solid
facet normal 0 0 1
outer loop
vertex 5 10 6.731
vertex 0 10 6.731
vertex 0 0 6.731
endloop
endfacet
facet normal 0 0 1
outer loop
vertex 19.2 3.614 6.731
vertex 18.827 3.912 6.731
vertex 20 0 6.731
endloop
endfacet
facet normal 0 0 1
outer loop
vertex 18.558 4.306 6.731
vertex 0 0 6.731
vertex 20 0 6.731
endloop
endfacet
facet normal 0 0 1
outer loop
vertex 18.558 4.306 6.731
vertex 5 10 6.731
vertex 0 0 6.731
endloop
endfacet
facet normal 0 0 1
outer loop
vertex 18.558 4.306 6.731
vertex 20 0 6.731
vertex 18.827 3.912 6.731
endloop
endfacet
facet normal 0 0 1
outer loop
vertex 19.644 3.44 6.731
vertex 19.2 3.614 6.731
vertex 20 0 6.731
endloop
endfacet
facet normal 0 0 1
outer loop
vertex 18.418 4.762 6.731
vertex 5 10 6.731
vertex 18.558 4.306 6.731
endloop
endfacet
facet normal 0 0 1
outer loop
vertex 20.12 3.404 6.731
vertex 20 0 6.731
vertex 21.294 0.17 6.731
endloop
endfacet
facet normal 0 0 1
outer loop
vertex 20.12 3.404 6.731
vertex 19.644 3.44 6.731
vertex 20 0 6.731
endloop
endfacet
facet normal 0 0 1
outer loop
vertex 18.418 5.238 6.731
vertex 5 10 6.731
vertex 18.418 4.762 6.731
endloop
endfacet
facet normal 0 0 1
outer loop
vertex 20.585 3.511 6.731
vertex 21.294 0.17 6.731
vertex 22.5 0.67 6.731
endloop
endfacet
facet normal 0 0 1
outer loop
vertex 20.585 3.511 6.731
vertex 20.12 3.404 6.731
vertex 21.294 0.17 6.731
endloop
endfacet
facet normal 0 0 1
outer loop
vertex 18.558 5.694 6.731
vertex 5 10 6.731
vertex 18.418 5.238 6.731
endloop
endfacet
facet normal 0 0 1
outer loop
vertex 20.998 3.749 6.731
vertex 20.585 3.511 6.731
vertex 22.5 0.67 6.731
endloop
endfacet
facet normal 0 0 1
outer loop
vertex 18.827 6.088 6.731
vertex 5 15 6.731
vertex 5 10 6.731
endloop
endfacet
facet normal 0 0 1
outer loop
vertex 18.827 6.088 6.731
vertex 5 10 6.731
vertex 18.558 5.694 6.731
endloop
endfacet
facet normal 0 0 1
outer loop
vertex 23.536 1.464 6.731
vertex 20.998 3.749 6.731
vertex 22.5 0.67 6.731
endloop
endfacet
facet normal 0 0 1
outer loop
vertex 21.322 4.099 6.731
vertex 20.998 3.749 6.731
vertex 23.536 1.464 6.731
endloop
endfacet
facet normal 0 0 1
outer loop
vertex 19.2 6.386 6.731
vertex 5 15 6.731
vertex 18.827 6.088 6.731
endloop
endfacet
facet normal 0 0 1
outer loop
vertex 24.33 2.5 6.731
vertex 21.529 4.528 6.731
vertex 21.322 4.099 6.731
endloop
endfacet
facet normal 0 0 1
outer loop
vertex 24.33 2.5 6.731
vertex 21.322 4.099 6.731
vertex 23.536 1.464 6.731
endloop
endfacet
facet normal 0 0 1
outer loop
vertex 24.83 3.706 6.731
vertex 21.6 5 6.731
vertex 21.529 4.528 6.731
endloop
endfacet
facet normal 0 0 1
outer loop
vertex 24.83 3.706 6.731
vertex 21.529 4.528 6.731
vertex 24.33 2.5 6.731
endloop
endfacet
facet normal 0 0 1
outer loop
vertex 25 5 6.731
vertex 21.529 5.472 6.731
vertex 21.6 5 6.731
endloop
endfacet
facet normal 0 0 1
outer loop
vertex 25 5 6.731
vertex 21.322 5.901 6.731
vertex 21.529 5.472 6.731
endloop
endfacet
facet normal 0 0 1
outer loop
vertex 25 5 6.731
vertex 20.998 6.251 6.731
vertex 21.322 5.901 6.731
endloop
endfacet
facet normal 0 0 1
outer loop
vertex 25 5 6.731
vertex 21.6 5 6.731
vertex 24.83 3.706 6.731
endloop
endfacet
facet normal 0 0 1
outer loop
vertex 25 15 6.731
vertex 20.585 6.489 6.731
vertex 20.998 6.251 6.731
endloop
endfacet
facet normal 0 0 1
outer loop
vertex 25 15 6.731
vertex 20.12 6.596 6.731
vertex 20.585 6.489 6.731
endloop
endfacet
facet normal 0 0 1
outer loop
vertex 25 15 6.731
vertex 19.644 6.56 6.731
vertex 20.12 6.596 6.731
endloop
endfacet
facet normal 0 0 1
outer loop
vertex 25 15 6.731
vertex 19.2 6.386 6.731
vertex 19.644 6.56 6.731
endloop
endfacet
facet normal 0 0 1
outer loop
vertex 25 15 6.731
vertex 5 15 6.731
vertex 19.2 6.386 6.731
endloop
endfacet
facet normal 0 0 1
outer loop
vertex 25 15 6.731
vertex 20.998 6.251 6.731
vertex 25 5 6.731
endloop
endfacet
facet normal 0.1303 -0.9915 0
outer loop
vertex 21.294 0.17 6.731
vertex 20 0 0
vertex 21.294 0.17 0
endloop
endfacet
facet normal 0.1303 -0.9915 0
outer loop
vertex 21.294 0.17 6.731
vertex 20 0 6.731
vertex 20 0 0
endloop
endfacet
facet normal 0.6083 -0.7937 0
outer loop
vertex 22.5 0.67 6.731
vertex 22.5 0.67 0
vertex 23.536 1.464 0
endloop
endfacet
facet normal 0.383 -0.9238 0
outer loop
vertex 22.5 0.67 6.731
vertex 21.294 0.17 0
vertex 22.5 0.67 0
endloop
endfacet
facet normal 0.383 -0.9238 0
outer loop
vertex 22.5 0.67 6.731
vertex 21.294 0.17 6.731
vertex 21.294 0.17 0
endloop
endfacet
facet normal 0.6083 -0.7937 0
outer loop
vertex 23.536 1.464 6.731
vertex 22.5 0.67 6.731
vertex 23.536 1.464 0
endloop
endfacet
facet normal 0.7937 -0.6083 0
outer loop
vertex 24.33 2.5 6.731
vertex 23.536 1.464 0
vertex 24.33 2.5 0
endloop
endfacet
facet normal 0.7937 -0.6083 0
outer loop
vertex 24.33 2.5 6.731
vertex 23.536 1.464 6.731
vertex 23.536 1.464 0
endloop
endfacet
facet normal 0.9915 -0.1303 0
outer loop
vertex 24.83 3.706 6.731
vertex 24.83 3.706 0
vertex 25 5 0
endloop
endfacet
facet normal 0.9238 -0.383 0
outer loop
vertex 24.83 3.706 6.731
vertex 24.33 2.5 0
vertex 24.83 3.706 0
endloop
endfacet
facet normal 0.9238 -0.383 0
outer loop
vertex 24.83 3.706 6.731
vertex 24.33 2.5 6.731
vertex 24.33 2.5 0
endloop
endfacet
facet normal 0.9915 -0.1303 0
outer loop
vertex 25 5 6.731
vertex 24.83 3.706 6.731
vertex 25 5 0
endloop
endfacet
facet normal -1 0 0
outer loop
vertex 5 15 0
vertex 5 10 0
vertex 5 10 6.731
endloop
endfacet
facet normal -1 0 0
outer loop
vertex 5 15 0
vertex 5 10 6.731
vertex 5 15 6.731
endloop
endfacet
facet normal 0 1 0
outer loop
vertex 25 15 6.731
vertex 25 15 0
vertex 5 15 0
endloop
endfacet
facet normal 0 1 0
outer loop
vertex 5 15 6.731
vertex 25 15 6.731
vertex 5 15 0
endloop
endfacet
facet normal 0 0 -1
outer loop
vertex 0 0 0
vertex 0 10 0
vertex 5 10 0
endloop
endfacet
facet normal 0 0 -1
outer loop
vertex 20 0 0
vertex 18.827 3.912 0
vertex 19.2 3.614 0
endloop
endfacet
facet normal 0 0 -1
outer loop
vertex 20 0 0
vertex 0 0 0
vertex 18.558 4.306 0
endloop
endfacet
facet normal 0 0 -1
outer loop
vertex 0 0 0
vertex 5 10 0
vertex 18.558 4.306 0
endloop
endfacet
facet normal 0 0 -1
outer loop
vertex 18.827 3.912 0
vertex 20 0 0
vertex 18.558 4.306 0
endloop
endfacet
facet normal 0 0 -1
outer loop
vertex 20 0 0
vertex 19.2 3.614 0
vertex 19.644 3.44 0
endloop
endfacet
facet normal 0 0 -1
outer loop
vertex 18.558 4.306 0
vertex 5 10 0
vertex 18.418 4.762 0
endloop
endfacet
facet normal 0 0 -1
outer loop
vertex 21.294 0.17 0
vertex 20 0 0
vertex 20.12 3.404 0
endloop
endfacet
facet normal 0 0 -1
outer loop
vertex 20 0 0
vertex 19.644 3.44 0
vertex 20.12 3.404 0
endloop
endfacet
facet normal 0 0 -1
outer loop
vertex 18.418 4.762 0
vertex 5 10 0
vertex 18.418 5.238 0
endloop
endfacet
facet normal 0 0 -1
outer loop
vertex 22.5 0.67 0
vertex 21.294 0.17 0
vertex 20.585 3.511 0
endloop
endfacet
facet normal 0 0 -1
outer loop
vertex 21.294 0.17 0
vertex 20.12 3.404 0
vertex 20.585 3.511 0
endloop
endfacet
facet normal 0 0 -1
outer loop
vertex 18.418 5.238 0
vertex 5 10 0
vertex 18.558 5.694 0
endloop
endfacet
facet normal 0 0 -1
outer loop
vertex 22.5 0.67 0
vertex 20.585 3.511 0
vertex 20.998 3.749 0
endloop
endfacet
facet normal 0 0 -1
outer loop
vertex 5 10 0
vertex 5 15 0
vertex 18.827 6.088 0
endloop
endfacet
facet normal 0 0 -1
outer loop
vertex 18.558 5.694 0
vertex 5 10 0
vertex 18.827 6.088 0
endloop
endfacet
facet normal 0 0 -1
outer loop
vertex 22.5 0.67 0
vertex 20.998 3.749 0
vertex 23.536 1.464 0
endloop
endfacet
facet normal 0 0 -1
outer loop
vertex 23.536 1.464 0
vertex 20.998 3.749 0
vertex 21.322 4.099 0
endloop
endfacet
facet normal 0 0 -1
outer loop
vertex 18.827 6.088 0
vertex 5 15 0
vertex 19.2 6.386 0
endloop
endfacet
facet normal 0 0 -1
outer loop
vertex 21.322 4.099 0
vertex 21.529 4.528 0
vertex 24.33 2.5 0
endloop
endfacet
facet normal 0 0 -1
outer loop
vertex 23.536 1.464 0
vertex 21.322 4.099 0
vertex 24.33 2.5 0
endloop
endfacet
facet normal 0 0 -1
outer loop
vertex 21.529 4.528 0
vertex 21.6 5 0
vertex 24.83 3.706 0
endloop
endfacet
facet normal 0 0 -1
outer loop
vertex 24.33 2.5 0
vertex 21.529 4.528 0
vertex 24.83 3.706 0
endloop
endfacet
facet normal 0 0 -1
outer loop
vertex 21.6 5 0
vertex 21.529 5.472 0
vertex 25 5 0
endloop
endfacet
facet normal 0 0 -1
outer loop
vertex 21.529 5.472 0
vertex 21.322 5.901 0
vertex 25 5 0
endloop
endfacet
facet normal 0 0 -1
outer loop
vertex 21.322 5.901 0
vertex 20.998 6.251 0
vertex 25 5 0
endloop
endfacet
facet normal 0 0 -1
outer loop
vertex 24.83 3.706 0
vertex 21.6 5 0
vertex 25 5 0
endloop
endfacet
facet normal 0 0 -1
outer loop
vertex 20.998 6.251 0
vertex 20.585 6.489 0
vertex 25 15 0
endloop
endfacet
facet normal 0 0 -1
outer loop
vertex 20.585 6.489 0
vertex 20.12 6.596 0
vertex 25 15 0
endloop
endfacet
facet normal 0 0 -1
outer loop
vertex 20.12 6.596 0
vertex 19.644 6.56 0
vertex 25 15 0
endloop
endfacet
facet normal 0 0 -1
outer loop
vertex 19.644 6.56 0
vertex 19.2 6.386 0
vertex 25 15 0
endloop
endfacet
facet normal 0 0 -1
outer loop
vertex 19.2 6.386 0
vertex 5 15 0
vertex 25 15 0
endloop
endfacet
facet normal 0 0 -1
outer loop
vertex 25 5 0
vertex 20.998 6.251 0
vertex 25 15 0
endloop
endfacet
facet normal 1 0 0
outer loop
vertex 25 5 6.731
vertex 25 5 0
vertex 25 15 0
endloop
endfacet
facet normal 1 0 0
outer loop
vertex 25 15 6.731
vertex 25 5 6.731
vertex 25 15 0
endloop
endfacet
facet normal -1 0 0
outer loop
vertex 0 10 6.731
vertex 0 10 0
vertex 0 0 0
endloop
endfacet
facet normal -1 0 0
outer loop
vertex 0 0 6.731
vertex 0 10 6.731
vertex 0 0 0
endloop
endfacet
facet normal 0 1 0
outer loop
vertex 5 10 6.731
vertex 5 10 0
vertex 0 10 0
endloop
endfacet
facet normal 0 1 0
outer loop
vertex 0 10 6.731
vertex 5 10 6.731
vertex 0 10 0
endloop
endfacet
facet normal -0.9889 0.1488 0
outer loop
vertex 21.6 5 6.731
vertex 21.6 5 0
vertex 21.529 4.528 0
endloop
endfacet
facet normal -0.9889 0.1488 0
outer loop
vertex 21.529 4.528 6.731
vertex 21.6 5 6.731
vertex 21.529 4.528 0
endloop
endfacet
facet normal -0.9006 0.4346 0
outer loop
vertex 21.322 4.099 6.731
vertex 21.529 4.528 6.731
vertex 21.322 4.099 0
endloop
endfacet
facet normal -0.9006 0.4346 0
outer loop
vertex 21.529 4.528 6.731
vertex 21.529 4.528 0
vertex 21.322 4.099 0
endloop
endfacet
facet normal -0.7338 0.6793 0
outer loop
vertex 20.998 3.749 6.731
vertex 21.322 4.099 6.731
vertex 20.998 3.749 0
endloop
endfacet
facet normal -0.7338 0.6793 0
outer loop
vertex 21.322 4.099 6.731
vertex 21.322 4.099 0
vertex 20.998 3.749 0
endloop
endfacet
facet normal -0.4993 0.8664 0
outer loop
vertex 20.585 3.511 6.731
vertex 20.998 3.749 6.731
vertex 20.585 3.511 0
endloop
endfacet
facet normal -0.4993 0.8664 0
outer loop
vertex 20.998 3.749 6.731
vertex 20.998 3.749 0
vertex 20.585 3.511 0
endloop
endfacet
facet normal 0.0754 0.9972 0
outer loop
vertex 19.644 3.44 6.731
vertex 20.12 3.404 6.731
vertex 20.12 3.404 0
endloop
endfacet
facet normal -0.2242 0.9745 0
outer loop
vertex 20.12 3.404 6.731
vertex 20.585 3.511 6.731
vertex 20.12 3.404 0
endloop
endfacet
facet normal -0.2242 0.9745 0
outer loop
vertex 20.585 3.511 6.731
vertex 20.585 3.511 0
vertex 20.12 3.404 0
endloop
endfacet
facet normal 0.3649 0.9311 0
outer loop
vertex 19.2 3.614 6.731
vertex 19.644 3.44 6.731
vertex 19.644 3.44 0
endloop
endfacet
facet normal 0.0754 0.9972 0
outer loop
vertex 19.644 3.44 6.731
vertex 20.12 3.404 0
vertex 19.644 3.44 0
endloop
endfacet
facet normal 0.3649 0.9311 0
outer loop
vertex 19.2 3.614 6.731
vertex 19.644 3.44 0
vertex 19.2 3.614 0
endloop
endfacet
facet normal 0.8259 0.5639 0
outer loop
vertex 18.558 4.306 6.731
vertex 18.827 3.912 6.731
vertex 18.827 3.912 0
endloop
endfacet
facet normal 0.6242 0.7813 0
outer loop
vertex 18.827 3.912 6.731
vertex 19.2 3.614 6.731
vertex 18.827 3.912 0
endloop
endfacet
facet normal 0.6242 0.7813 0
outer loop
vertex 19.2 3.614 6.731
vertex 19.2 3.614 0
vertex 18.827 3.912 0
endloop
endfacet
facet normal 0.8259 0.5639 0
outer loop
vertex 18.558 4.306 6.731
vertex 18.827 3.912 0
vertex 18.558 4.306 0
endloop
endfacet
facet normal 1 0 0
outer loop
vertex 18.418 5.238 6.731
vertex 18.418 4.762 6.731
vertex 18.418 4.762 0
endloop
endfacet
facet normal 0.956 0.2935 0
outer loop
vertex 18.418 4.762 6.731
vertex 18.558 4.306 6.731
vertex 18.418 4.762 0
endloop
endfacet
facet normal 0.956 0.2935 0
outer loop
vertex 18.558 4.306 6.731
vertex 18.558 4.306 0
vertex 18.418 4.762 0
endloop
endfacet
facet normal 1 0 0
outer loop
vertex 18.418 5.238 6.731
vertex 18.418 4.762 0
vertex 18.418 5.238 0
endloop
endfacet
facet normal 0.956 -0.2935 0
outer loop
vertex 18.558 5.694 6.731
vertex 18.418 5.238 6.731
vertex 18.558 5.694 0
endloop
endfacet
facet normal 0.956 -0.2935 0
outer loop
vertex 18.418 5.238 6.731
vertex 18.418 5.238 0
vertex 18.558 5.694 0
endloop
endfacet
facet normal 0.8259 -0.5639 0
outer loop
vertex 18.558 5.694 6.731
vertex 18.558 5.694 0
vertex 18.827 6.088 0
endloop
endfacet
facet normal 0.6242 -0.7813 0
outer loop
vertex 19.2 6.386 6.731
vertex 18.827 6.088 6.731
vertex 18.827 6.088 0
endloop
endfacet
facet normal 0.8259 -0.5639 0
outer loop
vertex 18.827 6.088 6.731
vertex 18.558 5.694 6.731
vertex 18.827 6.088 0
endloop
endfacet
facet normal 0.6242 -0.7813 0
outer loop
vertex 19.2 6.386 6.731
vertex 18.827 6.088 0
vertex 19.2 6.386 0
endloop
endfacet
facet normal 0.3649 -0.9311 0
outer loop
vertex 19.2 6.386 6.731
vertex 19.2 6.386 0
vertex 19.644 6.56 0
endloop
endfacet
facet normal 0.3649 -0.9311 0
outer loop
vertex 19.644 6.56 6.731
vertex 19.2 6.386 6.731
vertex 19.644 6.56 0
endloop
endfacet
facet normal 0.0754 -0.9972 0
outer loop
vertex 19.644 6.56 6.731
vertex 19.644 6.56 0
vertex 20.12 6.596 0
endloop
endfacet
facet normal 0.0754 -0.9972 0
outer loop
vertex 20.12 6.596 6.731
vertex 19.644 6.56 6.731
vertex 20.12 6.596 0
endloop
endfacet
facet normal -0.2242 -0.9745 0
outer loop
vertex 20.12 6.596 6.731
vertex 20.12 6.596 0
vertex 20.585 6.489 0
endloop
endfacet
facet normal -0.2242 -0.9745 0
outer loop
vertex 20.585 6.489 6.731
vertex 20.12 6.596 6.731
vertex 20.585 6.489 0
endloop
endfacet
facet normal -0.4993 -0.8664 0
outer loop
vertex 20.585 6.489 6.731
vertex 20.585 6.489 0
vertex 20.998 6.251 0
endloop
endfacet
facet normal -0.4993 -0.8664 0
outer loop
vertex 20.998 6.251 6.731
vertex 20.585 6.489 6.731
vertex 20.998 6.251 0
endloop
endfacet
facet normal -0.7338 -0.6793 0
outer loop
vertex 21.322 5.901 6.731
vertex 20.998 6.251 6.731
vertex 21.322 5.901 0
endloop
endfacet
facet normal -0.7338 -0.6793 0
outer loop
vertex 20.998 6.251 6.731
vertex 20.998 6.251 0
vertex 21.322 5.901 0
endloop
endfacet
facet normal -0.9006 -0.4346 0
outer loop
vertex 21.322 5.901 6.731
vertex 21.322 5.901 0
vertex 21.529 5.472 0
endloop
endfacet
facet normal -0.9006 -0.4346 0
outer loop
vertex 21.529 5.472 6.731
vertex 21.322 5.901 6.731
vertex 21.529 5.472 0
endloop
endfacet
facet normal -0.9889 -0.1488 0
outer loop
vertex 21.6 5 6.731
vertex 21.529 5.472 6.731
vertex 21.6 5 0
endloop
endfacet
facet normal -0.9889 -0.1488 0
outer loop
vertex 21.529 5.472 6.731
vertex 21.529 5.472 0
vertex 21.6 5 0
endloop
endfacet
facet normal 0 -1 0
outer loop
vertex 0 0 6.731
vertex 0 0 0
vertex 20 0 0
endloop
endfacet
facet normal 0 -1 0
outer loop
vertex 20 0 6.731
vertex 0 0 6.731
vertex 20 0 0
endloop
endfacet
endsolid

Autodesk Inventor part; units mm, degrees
ref_plane "YZ Plane" through (0, 0, 0) normal (1, 0, 0) x (0, 1, 0)
ref_plane "XZ Plane" through (0, 0, 0) normal (0, 1, 0) x (-1, 0, 0)
ref_plane "XY Plane" through (0, 0, 0) normal (0, 0, 1) x (1, 0, 0)
sketch "Sketch1" plane through (0, 0, 0) normal (0, 0, 1) x (1, 0, 0)
  line L0 (0, 0) -> (25, 0)
  line L1 (25, 0) -> (25, 15)
  line L2 (25, 15) -> (5, 15)
  circle A0 centre (20, 5) radius 1.6
  line L3 (5, 10) -> (0, 10)
  line L4 (0, 10) -> (0, 0)
  line L5 (5, 10) -> (5, 15)
  dimension "d2" = 3.2
  dimension "d3" = 10
  dimension "d4" = 5
  dimension "d12" = 20
  dimension "d16" = 15
  dimension "d17" = 5
  dimension "d18" = 5
extrude "Extrusion1" add sketch "Sketch1" along normal blind 6.731
fillet "Fillet1" radius 5 1 edges at (25, 0, 3.3655)
equation "\"d18\" = d17"
equation "\"d6\" = THICKB"
equation "\"THICKA\" = 3.175"
equation "\"THICKB\" = 6.731"
equation "\"THICKC\" = 12.7"
equation "\"BALLDIA\" = 12"
equation "\"MAGDIA\" = 9.5"
properties part number "Carriage_Belt_Lock_Flap"
